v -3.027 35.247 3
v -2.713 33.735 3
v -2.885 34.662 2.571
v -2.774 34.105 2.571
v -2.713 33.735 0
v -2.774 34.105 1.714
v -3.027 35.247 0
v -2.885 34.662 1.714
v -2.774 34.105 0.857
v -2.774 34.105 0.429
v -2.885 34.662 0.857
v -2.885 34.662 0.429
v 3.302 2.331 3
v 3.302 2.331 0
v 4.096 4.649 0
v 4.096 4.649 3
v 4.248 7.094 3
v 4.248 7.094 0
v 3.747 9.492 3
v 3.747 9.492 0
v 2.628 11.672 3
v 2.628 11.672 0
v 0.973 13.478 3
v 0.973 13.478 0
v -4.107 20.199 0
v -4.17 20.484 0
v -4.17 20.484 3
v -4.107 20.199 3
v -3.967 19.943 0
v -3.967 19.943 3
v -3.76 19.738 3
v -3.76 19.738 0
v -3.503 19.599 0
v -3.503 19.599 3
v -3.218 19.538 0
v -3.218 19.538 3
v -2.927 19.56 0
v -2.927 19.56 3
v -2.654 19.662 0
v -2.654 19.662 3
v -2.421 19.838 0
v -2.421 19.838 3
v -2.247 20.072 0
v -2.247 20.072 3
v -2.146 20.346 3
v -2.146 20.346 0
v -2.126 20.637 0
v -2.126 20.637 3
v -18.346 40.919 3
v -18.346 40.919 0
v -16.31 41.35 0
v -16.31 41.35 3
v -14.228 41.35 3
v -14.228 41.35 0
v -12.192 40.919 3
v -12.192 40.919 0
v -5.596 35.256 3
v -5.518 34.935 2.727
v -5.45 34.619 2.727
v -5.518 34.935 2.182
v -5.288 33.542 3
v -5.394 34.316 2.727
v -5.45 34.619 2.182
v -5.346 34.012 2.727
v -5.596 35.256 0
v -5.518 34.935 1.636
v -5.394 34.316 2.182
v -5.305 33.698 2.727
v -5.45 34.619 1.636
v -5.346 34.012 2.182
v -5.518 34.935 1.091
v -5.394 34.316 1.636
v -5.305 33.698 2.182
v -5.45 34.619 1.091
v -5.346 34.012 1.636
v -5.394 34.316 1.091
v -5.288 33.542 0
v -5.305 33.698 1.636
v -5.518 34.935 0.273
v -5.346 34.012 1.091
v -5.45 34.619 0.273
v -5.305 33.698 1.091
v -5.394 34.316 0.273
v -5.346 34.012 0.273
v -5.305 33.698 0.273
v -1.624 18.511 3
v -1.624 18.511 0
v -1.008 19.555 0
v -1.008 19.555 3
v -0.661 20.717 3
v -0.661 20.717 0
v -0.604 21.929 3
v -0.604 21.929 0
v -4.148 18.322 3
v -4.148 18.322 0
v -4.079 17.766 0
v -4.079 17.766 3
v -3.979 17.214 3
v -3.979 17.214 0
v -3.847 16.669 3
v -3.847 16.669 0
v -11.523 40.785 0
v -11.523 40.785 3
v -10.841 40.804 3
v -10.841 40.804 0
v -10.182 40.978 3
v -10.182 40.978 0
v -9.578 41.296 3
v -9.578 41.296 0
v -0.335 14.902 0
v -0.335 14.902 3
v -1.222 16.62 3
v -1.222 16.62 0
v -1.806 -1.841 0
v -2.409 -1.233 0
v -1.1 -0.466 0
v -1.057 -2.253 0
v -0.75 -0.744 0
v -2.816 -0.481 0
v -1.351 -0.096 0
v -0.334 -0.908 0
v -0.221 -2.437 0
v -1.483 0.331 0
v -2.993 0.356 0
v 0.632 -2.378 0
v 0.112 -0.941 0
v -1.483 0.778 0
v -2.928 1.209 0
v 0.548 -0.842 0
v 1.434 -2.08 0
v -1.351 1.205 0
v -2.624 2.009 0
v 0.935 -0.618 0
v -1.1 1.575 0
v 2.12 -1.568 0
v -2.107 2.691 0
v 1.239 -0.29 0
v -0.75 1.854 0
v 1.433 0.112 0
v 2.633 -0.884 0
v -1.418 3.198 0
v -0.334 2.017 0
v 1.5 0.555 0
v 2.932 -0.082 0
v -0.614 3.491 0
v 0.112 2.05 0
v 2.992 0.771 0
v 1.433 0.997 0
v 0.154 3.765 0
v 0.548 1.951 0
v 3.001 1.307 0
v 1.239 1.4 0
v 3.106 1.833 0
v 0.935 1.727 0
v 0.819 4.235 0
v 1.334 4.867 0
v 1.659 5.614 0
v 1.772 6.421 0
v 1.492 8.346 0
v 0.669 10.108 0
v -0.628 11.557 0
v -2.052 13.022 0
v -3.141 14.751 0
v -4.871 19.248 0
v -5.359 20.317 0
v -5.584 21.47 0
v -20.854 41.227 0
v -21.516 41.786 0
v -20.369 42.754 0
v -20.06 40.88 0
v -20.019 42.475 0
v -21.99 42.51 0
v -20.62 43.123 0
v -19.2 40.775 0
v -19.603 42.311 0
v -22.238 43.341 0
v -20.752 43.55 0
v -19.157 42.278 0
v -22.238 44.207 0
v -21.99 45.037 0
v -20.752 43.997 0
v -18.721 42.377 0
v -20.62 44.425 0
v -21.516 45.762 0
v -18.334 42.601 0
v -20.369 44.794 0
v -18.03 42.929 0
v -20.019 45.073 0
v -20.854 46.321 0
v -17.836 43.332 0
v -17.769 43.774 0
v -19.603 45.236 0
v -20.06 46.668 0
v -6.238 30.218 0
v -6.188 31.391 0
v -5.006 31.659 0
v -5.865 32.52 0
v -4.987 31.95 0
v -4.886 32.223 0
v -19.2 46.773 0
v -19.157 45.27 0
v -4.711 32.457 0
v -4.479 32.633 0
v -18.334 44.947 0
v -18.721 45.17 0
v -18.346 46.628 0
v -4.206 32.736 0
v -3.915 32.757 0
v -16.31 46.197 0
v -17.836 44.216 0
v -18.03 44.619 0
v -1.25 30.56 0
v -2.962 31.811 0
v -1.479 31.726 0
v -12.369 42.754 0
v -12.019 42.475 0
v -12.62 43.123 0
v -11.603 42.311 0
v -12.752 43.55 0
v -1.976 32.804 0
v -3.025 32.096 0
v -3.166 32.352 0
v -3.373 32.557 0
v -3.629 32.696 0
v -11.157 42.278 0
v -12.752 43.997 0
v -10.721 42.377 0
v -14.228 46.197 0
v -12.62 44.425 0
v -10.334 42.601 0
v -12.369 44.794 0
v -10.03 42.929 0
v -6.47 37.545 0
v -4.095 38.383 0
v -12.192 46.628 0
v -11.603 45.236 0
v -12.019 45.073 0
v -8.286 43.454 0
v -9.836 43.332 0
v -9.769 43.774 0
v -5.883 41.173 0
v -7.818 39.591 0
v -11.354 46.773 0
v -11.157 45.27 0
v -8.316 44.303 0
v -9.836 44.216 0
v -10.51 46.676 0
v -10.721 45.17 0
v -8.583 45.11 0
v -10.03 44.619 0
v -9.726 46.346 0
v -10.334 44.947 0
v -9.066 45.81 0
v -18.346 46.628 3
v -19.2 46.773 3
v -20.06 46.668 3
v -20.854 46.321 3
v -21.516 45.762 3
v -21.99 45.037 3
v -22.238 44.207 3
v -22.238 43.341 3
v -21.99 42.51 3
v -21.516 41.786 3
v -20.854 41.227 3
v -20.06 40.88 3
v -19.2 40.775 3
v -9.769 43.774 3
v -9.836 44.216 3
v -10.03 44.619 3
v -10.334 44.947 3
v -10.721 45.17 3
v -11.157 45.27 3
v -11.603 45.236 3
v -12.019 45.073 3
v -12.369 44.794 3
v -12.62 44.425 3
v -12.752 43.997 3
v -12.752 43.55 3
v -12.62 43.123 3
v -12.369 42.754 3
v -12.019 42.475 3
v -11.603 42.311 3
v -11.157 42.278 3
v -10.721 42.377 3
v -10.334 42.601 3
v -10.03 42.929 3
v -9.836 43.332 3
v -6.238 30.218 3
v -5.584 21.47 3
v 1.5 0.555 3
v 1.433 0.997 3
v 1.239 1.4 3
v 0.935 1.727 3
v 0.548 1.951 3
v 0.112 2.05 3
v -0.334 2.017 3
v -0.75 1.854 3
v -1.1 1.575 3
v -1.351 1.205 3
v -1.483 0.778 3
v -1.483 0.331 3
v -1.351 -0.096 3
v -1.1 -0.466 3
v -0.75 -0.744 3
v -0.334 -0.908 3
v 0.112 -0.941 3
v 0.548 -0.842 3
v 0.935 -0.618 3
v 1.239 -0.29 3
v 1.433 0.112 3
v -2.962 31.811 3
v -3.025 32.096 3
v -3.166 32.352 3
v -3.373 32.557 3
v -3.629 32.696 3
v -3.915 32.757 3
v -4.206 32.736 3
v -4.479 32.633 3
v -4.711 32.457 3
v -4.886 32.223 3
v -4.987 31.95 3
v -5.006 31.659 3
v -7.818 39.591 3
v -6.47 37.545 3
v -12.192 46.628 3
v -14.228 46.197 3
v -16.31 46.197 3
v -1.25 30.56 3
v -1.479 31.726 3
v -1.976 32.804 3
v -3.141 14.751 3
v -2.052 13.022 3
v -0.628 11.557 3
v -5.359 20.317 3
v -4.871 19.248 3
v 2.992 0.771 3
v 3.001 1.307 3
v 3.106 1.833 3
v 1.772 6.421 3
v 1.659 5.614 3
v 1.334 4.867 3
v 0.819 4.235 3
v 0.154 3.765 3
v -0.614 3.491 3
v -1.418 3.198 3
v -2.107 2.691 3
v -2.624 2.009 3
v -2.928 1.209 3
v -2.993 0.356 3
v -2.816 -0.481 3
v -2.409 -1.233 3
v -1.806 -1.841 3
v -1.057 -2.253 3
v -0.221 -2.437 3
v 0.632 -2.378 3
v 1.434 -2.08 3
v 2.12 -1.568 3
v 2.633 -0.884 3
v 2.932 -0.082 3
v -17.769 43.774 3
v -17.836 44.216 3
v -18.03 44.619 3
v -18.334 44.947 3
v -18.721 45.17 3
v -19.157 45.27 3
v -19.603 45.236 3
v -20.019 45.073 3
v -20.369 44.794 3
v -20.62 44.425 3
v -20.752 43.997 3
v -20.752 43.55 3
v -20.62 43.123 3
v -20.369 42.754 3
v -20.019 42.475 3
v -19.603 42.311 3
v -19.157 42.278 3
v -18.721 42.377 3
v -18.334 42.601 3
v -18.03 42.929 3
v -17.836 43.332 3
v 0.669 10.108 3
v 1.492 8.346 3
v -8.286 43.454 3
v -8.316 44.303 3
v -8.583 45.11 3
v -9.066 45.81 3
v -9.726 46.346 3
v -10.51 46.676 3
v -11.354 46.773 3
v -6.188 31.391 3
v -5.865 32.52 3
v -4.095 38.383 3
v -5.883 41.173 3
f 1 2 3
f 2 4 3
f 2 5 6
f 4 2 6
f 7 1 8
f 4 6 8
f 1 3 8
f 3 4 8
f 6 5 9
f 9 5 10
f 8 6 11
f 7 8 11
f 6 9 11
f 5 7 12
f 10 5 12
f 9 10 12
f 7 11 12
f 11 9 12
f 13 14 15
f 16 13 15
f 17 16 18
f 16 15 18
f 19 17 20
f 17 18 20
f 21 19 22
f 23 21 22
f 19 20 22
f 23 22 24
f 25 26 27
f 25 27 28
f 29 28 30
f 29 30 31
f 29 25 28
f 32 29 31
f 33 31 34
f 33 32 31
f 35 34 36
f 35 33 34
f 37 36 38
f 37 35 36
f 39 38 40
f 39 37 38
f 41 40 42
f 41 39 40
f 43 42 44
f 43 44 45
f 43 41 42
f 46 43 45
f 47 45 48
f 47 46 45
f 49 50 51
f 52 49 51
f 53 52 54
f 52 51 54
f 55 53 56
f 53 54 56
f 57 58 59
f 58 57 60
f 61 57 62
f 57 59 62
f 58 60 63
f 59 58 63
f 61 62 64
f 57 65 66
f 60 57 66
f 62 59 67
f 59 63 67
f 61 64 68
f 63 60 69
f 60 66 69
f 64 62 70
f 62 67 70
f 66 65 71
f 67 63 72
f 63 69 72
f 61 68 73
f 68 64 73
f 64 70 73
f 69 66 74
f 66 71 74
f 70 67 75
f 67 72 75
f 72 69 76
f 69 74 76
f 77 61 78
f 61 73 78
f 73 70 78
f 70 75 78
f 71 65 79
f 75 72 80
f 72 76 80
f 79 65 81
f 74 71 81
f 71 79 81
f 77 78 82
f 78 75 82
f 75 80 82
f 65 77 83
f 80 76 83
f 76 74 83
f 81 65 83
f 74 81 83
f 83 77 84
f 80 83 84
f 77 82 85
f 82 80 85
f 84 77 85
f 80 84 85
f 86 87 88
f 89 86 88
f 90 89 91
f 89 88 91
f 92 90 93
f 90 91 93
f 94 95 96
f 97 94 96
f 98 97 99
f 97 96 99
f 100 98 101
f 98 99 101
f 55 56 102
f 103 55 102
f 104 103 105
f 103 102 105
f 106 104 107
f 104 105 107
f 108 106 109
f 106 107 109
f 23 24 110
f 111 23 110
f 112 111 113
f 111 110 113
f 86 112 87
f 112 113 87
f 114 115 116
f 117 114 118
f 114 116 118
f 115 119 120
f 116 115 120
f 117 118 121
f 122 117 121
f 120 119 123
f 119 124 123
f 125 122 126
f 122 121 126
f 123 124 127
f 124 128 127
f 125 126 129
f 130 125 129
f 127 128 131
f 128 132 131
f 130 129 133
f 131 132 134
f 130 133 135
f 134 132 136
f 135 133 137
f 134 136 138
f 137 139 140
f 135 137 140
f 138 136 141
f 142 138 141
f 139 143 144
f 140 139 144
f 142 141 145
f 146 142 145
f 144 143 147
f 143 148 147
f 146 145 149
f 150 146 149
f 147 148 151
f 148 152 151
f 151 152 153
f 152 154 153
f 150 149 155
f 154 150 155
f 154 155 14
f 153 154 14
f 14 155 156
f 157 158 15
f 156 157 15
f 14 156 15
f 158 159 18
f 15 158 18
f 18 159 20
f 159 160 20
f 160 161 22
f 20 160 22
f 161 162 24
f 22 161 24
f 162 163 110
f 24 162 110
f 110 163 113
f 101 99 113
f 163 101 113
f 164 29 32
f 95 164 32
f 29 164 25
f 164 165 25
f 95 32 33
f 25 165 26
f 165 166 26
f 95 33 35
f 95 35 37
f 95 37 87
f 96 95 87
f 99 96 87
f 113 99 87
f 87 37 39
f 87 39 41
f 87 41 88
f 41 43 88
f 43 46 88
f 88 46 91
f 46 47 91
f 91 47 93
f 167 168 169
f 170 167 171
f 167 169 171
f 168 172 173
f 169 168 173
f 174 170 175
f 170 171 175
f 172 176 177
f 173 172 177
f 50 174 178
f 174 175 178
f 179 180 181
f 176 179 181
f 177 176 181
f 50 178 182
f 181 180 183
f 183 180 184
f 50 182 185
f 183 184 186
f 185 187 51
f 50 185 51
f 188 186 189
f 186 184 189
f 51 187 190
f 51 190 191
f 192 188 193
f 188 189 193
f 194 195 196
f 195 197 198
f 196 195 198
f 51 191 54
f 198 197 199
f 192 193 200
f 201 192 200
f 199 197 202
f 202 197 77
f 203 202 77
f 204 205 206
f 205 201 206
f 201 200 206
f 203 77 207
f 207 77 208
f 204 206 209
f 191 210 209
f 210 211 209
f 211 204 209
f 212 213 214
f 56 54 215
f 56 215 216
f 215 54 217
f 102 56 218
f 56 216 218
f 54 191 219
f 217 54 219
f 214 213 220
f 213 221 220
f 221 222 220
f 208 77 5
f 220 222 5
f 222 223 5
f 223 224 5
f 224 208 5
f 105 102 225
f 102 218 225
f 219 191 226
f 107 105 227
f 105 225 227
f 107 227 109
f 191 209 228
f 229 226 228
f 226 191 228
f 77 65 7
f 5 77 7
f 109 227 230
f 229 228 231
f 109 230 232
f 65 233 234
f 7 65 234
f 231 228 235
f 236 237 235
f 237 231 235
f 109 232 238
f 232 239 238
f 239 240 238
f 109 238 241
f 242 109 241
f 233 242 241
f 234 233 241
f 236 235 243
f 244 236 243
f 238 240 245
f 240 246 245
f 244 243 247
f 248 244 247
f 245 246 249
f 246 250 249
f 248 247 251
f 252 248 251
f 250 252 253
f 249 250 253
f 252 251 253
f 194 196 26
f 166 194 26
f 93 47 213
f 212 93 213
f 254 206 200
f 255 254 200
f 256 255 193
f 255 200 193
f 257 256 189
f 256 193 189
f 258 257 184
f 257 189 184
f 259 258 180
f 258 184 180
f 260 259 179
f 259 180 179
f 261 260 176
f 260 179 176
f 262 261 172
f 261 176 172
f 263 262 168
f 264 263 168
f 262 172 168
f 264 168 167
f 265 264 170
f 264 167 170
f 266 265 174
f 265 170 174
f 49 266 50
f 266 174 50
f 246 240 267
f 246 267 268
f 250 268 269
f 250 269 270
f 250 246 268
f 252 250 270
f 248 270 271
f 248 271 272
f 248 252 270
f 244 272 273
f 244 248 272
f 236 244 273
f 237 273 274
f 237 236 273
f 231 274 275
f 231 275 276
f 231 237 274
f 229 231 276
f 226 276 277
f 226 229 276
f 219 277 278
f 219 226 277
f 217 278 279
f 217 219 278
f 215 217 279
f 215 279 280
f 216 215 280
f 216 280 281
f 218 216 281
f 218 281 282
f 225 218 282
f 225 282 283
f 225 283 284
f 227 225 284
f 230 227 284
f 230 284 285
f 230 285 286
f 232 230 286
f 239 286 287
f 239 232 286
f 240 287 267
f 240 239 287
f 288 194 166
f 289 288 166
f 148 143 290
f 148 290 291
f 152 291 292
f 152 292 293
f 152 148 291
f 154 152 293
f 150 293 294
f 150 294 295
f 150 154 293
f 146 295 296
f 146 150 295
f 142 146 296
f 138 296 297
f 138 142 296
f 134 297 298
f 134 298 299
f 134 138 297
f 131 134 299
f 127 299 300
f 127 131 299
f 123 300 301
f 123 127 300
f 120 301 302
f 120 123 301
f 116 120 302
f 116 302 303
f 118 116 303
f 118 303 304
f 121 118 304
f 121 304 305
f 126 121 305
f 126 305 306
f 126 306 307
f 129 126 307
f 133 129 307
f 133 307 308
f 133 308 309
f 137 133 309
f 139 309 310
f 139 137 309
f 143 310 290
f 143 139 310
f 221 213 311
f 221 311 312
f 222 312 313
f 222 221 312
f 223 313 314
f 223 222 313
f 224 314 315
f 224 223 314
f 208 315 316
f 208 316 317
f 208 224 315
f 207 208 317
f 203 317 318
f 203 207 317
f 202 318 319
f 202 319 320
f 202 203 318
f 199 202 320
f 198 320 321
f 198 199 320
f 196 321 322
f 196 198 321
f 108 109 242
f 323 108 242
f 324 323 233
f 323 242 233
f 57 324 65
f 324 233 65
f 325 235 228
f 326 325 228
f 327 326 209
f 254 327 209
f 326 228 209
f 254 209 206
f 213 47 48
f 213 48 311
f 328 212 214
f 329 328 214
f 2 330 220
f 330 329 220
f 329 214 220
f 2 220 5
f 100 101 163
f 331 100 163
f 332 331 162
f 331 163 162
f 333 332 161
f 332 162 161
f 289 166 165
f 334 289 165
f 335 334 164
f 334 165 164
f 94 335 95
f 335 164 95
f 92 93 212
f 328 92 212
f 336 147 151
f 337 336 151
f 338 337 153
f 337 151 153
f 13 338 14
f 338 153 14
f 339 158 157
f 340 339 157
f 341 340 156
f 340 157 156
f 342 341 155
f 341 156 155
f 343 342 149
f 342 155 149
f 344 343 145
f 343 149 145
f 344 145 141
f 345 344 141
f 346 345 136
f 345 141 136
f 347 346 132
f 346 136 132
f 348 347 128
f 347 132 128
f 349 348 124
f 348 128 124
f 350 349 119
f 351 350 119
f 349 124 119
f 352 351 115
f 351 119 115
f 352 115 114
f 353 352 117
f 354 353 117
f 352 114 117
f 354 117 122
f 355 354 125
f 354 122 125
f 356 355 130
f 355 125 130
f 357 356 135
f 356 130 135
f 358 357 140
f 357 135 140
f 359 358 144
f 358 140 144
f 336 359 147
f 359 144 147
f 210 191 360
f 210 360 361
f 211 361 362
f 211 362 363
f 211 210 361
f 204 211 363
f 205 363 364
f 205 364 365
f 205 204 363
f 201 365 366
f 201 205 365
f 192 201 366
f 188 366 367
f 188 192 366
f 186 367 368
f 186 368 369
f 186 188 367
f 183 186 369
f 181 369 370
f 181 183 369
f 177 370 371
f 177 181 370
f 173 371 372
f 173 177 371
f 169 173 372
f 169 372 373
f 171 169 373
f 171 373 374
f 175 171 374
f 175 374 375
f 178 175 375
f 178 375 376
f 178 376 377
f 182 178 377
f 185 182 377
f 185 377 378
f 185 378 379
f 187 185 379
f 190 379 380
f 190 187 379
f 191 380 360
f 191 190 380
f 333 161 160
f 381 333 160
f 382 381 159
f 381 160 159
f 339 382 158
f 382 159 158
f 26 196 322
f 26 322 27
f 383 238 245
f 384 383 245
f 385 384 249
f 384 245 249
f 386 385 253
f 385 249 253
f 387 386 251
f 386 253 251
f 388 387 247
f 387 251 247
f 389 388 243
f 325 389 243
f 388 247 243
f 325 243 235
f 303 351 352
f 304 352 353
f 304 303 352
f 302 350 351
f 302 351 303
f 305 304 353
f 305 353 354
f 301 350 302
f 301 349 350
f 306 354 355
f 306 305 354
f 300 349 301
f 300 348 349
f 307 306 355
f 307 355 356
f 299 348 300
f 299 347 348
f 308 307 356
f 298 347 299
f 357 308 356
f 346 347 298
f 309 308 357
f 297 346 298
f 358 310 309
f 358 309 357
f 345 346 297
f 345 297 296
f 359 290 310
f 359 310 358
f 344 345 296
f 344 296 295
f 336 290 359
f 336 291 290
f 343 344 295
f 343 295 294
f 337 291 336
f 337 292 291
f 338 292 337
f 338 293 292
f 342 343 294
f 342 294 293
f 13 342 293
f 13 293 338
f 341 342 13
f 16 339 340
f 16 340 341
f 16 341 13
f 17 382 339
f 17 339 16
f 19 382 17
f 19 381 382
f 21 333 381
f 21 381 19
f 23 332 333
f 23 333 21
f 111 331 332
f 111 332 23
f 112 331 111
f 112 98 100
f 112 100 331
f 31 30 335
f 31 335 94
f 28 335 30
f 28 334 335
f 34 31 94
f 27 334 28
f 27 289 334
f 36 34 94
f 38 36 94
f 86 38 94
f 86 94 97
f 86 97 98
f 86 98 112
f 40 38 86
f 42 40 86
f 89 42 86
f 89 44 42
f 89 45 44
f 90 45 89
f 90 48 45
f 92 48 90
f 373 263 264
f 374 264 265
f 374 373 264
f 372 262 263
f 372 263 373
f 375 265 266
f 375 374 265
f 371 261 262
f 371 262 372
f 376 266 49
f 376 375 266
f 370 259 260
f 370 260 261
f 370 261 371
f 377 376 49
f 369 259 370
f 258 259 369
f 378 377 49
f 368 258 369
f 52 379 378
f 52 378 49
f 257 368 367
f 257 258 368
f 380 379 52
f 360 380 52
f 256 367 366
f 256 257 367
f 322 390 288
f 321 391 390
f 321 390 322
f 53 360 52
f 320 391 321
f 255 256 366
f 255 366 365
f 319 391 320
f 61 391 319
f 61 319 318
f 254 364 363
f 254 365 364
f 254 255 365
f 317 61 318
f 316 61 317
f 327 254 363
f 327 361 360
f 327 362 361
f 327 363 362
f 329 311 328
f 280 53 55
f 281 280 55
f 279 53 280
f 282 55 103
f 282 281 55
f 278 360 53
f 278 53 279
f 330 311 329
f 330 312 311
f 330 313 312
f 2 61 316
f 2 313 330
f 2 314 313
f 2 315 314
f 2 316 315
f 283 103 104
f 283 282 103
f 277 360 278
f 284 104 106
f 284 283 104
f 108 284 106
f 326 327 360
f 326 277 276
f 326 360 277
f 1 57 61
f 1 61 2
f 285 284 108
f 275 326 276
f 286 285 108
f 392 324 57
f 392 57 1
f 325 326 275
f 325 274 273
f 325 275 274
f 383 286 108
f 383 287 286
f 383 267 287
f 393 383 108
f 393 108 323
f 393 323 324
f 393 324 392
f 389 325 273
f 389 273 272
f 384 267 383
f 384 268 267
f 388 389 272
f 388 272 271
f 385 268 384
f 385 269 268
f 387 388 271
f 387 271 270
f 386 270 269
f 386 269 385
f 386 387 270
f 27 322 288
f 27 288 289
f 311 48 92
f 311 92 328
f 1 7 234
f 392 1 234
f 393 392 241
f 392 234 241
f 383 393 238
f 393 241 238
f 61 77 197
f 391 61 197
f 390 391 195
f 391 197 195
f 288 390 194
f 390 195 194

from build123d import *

# Parameters (mm, degrees)
BOSS_EXTRUDE1_OUTLINE_R = 1.5
BOSS_EXTRUDE1_DEPTH     = 3
FILLET1_R               = 5
CUT_EXTRUDE1_DEPTH      = 3


# Read off the part's stored shape, not the designer's step: Boss-Extrude1
with BuildPart() as part:
    # Boss-Extrude1 outline → Boss-Extrude1 (new body)
    with BuildSketch(Plane.XY):
        with BuildLine():
            ThreePointArc((-9.577975431, 41.29578544), (-7.088317742, 38.60475873), (-5.596455347, 35.255972867))
            add(Edge.make_bspline(
                [(-5.596455347, 35.255972867), (-5.582747417, 35.202444502), (-5.55529889, 35.095260217), (-5.517467472, 34.934551052), (-5.482131356, 34.775084793), (-5.449615345, 34.617937051), (-5.419947602, 34.464275495), (-5.393218029, 34.315238656), (-5.368054814, 34.162831666), (-5.344795736, 34.008181607), (-5.322858552, 33.847412998), (-5.30329297, 33.684837729), (-5.293582635, 33.591977311), (-5.288408722, 33.542498925)],
                knots=[0, 0, 0, 0, 0.07878117, 0.157750071, 0.236927243, 0.316333061, 0.395987726, 0.475911251, 0.556123446, 0.652047242, 0.7511991, 0.867432569, 1, 1, 1, 1], degree=3))
            Line((-5.288408722, 33.542498925), (-6.480466419, 33.453304935))
            Line((-6.480466419, 33.453304935), (-5.341603358, 18.232655185))
            Line((-5.341603358, 18.232655185), (-4.147731483, 18.321984917))
            ThreePointArc((-4.147731483, 18.321984917), (-4.032924942, 17.489163116), (-3.846988472, 16.66928488))
            ThreePointArc((-3.846988472, 16.66928488), (-2.642137665, 13.858181692), (-0.627607898, 11.55695671))
            ThreePointArc((-0.627607898, 11.55695671), (1.144975693, 9.256897759), (1.771644479, 6.421477156))
            ThreePointArc((1.771644479, 6.421477156), (1.098096567, 4.533436187), (-0.614174692, 3.491086617))
            ThreePointArc((-0.614174692, 3.491086617), (-1.806361188, -1.840587951), (2.992161355, 0.771354572))
            ThreePointArc((2.992161355, 0.771354572), (3.041722898, 1.572124284), (3.301741951, 2.331122684))
            ThreePointArc((3.301741951, 2.331122684), (4.077870779, 8.309876297), (0.972698011, 13.47763914))
            ThreePointArc((0.972698011, 13.47763914), (-0.835685645, 15.731138378), (-1.624382222, 18.510790869))
            Line((-1.624382222, 18.510790869), (-0.35554127, 18.605730055))
            Line((-0.35554127, 18.605730055), (-1.494404331, 33.826379806))
            Line((-1.494404331, 33.826379806), (-2.713176612, 33.735186936))
            add(Edge.make_bspline(
                [(-2.713176612, 33.735186936), (-2.713923066, 33.740199809), (-2.719747517, 33.779179521), (-2.737276775, 33.893529306), (-2.771774985, 34.097834296), (-2.823249297, 34.37037297), (-2.883340819, 34.657944683), (-2.950356176, 34.952197534), (-3.001326008, 35.14925666), (-3.026538809, 35.246734176)],
                knots=[0.162262456, 0.162262456, 0.162262456, 0.162262456, 0.173543134, 0.249389735, 0.406042985, 0.559353198, 0.709395257, 0.856249091, 1, 1, 1, 1], degree=3))
            ThreePointArc((-3.026538809, 35.246734176), (-4.904423993, 39.832081027), (-8.286103826, 43.453696691))
            ThreePointArc((-8.286103826, 43.453696691), (-9.376853546, 46.101850718), (-12.192055187, 46.62824831))
            ThreePointArc((-12.192055187, 46.62824831), (-15.268978264, 46.143107446), (-18.345901341, 46.62824831))
            ThreePointArc((-18.345901341, 46.62824831), (-22.268978264, 43.77379057), (-18.345901341, 40.919332829))
            ThreePointArc((-18.345901341, 40.919332829), (-15.268978264, 41.404473693), (-12.192055187, 40.919332829))
            ThreePointArc((-12.192055187, 40.919332829), (-10.841360803, 40.804423077), (-9.577975431, 41.29578544))
        make_face()
        with Locations((0, 0.55462796)):
            Circle(BOSS_EXTRUDE1_OUTLINE_R, mode=Mode.SUBTRACT)
        with Locations((-19.268978264, 43.773790569)):
            Circle(BOSS_EXTRUDE1_OUTLINE_R, mode=Mode.SUBTRACT)
        with Locations((-11.268978264, 43.773790569)):
            Circle(BOSS_EXTRUDE1_OUTLINE_R, mode=Mode.SUBTRACT)
    extrude(amount=BOSS_EXTRUDE1_DEPTH)

    # Fillet1
    # the kernel refuses this fillet: 5 mm, written as the material it takes off along each edge
    with BuildSketch(Plane(origin=(-6.480466419, 33.453304935, -8.110541878), x_dir=(0.9972124174989766, 0.07461497427357966, 0), z_dir=(0, 0, 1))) as fillet1_piece_1:
        with BuildLine():
            CenterArc((4.999999999, -3.244216752), FILLET1_R, 139.545547884, 40.454452104)
            Line((-1e-09, -3.244216751), (-0.100000001, -3.244216751))
            Line((-0.100000001, -3.244216751), (-0.1, 0))
            Line((-0.1, 0), (0, 0.1))
            ThreePointArc((0, 0.1), (0.597694973, 0.1), (1.119297744, 0.064884335))
            Line((1.119297744, 0.064884335), (1.195389945, 0))
        make_face()
    extrude(amount=19.221083756, mode=Mode.SUBTRACT)
    with BuildSketch(Plane(origin=(-1.494404331, 33.826379806, -8.188433173), x_dir=(0.07461497405549736, -0.9972124175152941, 0), z_dir=(0, 0, 1))) as fillet1_piece_2:
        with BuildLine():
            CenterArc((3.275373269, -5), FILLET1_R, 90, 40.925310843)
            Line((0, -1.222179206), (-0.065507465, -1.14662279))
            ThreePointArc((-0.065507465, -1.14662279), (-0.1, -0.611089603), (-0.1, 0))
            Line((-0.1, 0), (0, 0.1))
            Line((0, 0.1), (3.275373269, 0.1))
            Line((3.275373269, 0.1), (3.275373269, 0))
        make_face()
    extrude(amount=19.376866346, mode=Mode.SUBTRACT)
    with BuildSketch(Plane(origin=(-5.341603358, 18.232655185, -8.115872597), x_dir=(-0.07461497406037235, 0.9972124175149295, 0), z_dir=(0, 0, 1))) as fillet1_piece_3:
        with BuildLine():
            CenterArc((3.246349039, -5), FILLET1_R, 90, 40.486571122)
            Line((-1e-09, -1.197209194), (-0.064926982, -1.121153378))
            ThreePointArc((-0.064926982, -1.121153378), (-0.1, -0.598604597), (-0.1, 0))
            Line((-0.1, 0), (0, 0.1))
            Line((0, 0.1), (3.246349039, 0.1))
            Line((3.246349039, 0.1), (3.246349039, 0))
        make_face()
    extrude(amount=19.231745194, mode=Mode.SUBTRACT)
    with BuildSketch(Plane(origin=(-0.35554127, 18.605730055, -8.33100668), x_dir=(-0.9972124174875004, -0.07461497442695494, 0), z_dir=(0, 0, 1))) as fillet1_piece_4:
        with BuildLine():
            CenterArc((4.999999999, -3.332402674), FILLET1_R, 138.203991534, 41.796008444)
            Line((-1e-09, -3.332402672), (-0.100000001, -3.332402672))
            Line((-0.100000001, -3.332402672), (-0.1, 0))
            Line((-0.1, 0), (0, 0.1))
            ThreePointArc((0, 0.1), (0.636193919, 0.1), (1.197835595, 0.066648053))
            Line((1.197835595, 0.066648053), (1.272387838, 0))
        make_face()
    extrude(amount=19.662013359, mode=Mode.SUBTRACT)

    # Sketch2 → Cut-Extrude1 (cut)
    with BuildSketch(Plane(origin=(0, 0, 0), x_dir=(-1, 0, 0), z_dir=(0, 0, -1))):
        with BuildLine():
            Line((5.006415896, 31.658546167), (4.17027649, 20.483730275))
            ThreePointArc((4.17027649, 20.483730275), (3.071829301, 19.538219294), (2.12631832, 20.636666483))
            Line((2.12631832, 20.636666483), (2.962457726, 31.811482375))
            ThreePointArc((2.962457726, 31.811482375), (4.060904915, 32.756993356), (5.006415896, 31.658546167))
        make_face()
    extrude(amount=-CUT_EXTRUDE1_DEPTH, mode=Mode.SUBTRACT)


solid = part.part
